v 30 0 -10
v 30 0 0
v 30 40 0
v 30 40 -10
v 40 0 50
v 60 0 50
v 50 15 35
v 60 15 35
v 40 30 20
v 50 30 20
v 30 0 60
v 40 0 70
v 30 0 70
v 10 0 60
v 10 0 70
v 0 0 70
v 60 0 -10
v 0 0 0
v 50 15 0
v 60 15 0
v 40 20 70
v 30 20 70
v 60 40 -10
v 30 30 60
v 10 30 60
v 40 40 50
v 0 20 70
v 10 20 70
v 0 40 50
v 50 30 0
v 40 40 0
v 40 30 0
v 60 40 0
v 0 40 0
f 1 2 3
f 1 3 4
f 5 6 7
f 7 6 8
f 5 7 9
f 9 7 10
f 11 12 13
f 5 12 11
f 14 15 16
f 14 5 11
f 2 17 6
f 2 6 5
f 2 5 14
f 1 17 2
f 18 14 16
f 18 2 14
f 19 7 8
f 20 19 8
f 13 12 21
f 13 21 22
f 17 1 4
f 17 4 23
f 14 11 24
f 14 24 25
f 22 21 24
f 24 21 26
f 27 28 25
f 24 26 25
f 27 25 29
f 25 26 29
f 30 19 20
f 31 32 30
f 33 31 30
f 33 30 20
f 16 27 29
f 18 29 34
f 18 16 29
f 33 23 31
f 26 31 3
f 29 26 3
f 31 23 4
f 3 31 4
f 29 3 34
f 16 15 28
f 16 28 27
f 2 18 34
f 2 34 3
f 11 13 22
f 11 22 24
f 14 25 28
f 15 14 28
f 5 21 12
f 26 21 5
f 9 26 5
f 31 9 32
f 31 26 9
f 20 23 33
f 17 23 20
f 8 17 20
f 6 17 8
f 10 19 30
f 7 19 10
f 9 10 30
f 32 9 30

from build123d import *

# Parameters (mm, degrees)
BOSS_EXTRUDE1_DEPTH = 40
CHAMFER1_SIZE       = 20
CUT_EXTRUDE1_DEPTH  = 20
SKETCH3_W           = 10
SKETCH3_H           = 15
CUT_EXTRUDE2_DEPTH  = 70


with BuildPart() as part:
    # Sketch1 → Boss-Extrude1 (new body)
    with BuildSketch(Plane(origin=(0, 0, 0), x_dir=(1, 0, 0), z_dir=(0, 1, 0))):
        Polygon((0, 0), (30, 0), (30, 10), (60, 10), (60, -60), (40, -60), (40, -70), (30, -70), (30, -60), (10, -60), (10, -70), (0, -70), align=None)
    extrude(amount=BOSS_EXTRUDE1_DEPTH)

    # Chamfer1
    chamfer1_edges = [part.edges().sort_by_distance(p)[0] for p in [
        (5, 40, 70),
    ]]
    chamfer(chamfer1_edges, length=CHAMFER1_SIZE)

    # Sketch2 → Cut-Extrude1 (cut)
    with BuildSketch(Plane(origin=(60, 0, 0), x_dir=(0, 0, -1), z_dir=(1, 0, 0))):
        Polygon((0, 30), (0, 40), (-50, 40), (-60, 30), (-60, 0), (-50, 0), (-20, 30), align=None)
    extrude(amount=-CUT_EXTRUDE1_DEPTH, mode=Mode.SUBTRACT)

    # Sketch3 → Cut-Extrude2 (cut)
    with BuildSketch(Plane.XY.offset(70)):
        with Locations((55, 22.5)):
            Rectangle(SKETCH3_W, SKETCH3_H)
    extrude(amount=-CUT_EXTRUDE2_DEPTH, mode=Mode.SUBTRACT)


solid = part.part
